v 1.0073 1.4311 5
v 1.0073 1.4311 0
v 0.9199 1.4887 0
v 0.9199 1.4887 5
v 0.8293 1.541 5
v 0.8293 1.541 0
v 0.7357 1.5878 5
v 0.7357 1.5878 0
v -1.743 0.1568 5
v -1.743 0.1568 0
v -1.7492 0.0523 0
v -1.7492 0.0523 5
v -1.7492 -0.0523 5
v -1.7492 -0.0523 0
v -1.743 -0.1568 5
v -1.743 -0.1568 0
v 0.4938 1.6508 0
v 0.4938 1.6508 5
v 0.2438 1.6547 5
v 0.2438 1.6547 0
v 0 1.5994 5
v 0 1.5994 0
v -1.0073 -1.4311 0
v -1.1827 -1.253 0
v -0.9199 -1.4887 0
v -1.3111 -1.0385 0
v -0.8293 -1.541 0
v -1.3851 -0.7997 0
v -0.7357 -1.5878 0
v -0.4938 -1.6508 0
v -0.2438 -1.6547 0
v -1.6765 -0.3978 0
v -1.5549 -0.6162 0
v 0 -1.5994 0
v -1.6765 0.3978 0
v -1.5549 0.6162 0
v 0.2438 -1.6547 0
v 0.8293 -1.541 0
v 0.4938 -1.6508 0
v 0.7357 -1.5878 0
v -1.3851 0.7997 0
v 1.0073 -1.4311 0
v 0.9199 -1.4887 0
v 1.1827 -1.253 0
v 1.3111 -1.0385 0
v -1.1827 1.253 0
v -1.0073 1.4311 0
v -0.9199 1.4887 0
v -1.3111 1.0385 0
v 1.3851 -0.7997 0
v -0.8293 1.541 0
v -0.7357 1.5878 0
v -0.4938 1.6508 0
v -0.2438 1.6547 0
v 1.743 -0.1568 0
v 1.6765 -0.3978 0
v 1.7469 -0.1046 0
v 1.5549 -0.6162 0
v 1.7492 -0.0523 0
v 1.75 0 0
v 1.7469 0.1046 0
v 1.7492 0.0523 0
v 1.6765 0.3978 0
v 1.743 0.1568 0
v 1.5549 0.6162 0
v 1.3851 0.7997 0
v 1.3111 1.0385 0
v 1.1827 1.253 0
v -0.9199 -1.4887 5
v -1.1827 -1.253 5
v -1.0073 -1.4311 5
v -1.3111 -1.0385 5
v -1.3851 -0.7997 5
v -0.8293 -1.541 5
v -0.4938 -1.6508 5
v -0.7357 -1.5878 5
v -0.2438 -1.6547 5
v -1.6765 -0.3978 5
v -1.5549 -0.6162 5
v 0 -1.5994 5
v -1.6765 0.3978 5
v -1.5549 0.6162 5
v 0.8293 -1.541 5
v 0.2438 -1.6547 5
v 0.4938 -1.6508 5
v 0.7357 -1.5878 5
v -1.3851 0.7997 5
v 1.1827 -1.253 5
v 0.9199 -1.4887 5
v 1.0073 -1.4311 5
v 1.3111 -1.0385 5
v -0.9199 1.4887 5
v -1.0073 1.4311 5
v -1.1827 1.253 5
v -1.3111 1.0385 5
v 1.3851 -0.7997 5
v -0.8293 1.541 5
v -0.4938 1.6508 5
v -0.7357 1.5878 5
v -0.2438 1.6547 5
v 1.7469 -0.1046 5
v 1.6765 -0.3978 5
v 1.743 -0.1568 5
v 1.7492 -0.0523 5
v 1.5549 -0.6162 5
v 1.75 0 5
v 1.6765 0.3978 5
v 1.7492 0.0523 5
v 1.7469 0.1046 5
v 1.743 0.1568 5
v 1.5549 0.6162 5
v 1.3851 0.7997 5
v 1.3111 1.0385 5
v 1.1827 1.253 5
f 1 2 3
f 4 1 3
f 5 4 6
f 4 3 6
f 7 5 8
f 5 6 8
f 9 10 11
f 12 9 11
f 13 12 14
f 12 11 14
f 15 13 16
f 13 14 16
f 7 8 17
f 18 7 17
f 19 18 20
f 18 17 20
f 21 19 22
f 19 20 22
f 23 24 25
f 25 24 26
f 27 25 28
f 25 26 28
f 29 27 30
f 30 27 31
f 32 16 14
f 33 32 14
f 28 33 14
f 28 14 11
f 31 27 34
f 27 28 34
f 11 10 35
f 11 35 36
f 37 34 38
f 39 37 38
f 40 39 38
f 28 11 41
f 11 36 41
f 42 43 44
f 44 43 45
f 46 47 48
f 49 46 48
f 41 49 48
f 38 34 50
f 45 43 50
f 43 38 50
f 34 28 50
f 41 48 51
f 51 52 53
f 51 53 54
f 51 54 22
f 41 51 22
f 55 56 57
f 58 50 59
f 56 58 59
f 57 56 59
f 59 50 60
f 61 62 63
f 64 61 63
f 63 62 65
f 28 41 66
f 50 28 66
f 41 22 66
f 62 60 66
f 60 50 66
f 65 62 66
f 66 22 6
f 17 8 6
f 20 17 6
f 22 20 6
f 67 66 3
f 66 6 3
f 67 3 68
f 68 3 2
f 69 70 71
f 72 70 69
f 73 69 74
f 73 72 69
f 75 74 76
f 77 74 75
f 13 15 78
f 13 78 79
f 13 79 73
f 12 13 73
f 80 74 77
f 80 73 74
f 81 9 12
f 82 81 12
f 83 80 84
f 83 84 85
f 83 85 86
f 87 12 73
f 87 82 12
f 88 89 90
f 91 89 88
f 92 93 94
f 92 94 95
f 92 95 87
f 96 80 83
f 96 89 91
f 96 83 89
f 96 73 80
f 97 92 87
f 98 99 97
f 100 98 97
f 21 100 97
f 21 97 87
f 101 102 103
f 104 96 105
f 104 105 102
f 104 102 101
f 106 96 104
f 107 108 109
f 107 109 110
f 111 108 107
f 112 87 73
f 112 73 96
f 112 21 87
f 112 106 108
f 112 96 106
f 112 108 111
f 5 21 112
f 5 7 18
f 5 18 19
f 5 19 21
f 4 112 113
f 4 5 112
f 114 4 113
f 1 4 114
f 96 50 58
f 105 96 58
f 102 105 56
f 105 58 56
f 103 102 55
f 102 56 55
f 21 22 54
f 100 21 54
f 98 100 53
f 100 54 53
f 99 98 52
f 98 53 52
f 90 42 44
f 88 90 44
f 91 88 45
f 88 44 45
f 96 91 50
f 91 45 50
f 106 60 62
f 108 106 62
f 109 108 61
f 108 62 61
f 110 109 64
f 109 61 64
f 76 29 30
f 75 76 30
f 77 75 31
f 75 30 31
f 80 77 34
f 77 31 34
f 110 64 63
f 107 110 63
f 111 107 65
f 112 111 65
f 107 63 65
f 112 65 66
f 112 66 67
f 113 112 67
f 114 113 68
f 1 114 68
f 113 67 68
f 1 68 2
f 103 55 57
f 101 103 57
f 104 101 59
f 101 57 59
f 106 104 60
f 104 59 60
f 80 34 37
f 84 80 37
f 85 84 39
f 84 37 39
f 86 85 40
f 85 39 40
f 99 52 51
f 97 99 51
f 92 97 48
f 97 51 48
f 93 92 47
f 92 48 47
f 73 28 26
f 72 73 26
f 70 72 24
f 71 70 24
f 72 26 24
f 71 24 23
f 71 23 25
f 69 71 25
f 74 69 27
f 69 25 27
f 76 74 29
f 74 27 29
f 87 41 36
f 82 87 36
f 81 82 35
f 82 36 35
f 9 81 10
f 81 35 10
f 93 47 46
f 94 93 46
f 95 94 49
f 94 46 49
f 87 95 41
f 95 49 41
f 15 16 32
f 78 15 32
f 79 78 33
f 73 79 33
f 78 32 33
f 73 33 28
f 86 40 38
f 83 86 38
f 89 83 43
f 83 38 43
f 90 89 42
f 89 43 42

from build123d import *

# Parameters (mm, degrees)
F1_DEPTH = 5


with BuildPart() as f1:
    # F0 (on Top) → F1 (new body)
    with BuildSketch(Plane.XY):
        with BuildLine():
            ThreePointArc((1.7429623373, -0.1567874062), (1.748239699, -0.0784726376), (1.75, 0))
            ThreePointArc((1.75, 0), (1.748239699, 0.0784726376), (1.7429623373, 0.1567874062))
            ThreePointArc((1.7429623373, 0.1567874062), (1.6222133761, 0.5106191558), (1.3851445143, 0.7997135582))
            ThreePointArc((1.3851445143, 0.7997135582), (1.3980525813, 0.7054063545), (1.4023670894, 0.6103177017))
            ThreePointArc((1.4023670894, 0.6103177017), (1.3522740733, 0.2898711016), (1.2067746637, 0))
            ThreePointArc((1.2067746637, 0), (1.3522740733, -0.2898711016), (1.4023670894, -0.6103177017))
            ThreePointArc((1.4023670894, -0.6103177017), (1.3980525813, -0.7054063545), (1.3851445143, -0.7997135582))
            ThreePointArc((1.3851445143, -0.7997135582), (1.6222133761, -0.5106191558), (1.7429623373, -0.1567874062))
        make_face()
        with BuildLine():
            ThreePointArc((1.3851445143, 0.7997135582), (1.2533158487, 1.1495684162), (1.0072630454, 1.4310559589))
            ThreePointArc((1.0072630454, 1.4310559589), (0.875, 1.5155444566), (0.7356992919, 1.587843365))
            ThreePointArc((0.7356992919, 1.587843365), (0.3688975274, 1.660187572), (0, 1.5994271164))
            ThreePointArc((0, 1.5994271164), (0.357996056, 1.3835474229), (0.6033873318, 1.0450975154))
            ThreePointArc((0.6033873318, 1.0450975154), (1.0191891876, 1.0018073904), (1.3851445143, 0.7997135582))
        make_face()
        with BuildLine():
            ThreePointArc((1.4023670894, 0.6103177017), (1.3980525813, 0.7054063545), (1.3851445143, 0.7997135582))
            ThreePointArc((1.3851445143, 0.7997135582), (1.0191891876, 1.0018073904), (0.6033873318, 1.0450975154))
            ThreePointArc((0.6033873318, 1.0450975154), (0.6738010602, 0.8327562974), (0.6976329106, 0.6103177017))
            ThreePointArc((0.6976329106, 0.6103177017), (0.6917287242, 0.4991244824), (0.6740825639, 0.3891817497))
            ThreePointArc((0.6740825639, 0.3891817497), (0.9717877583, 0.23751367), (1.2067746637, 0))
            ThreePointArc((1.2067746637, 0), (1.3522740733, 0.2898711016), (1.4023670894, 0.6103177017))
        make_face()
        with BuildLine():
            ThreePointArc((0.7356992919, -1.587843365), (0.875, -1.5155444566), (1.0072630454, -1.4310559589))
            ThreePointArc((1.0072630454, -1.4310559589), (1.2533158487, -1.1495684162), (1.3851445143, -0.7997135582))
            ThreePointArc((1.3851445143, -0.7997135582), (1.0191891876, -1.0018073904), (0.6033873318, -1.0450975154))
            ThreePointArc((0.6033873318, -1.0450975154), (0.357996056, -1.3835474229), (0, -1.5994271164))
            ThreePointArc((0, -1.5994271164), (0.3688975274, -1.660187572), (0.7356992919, -1.587843365))
        make_face()
        with BuildLine():
            ThreePointArc((0.6033873318, -1.0450975154), (1.0191891876, -1.0018073904), (1.3851445143, -0.7997135582))
            ThreePointArc((1.3851445143, -0.7997135582), (1.3980525813, -0.7054063545), (1.4023670894, -0.6103177017))
            ThreePointArc((1.4023670894, -0.6103177017), (1.3522740733, -0.2898711016), (1.2067746637, 0))
            ThreePointArc((1.2067746637, 0), (0.9717877583, -0.23751367), (0.6740825639, -0.3891817497))
            ThreePointArc((0.6740825639, -0.3891817497), (0.6917287242, -0.4991244824), (0.6976329106, -0.6103177017))
            ThreePointArc((0.6976329106, -0.6103177017), (0.6738010602, -0.8327562974), (0.6033873318, -1.0450975154))
        make_face()
        with BuildLine():
            ThreePointArc((0.6976329106, 0.6103177017), (0.6738010602, 0.8327562974), (0.6033873318, 1.0450975154))
            ThreePointArc((0.6033873318, 1.0450975154), (0.2802010071, 0.9603497208), (0, 0.7783634995))
            ThreePointArc((0, 0.7783634995), (0.143097193, 0.6194206689), (0.2510202425, 0.4347798137))
            ThreePointArc((0.2510202425, 0.4347798137), (0.4648854384, 0.4336361388), (0.6740825639, 0.3891817497))
            ThreePointArc((0.6740825639, 0.3891817497), (0.6917287242, 0.4991244824), (0.6976329106, 0.6103177017))
        make_face()
        with BuildLine():
            ThreePointArc((0, 0.7783634995), (0.2802010071, 0.9603497208), (0.6033873318, 1.0450975154))
            ThreePointArc((0.6033873318, 1.0450975154), (0.357996056, 1.3835474229), (0, 1.5994271164))
            ThreePointArc((0, 1.5994271164), (-0.357996056, 1.3835474229), (-0.6033873318, 1.0450975154))
            ThreePointArc((-0.6033873318, 1.0450975154), (-0.2802010071, 0.9603497208), (0, 0.7783634995))
        make_face()
        with BuildLine():
            ThreePointArc((0, -0.7783634995), (0.2802010071, -0.9603497208), (0.6033873318, -1.0450975154))
            ThreePointArc((0.6033873318, -1.0450975154), (0.6738010602, -0.8327562974), (0.6976329106, -0.6103177017))
            ThreePointArc((0.6976329106, -0.6103177017), (0.6917287242, -0.4991244824), (0.6740825639, -0.3891817497))
            ThreePointArc((0.6740825639, -0.3891817497), (0.4648854384, -0.4336361388), (0.2510202425, -0.4347798137))
            ThreePointArc((0.2510202425, -0.4347798137), (0.143097193, -0.6194206689), (0, -0.7783634995))
        make_face()
        with BuildLine():
            ThreePointArc((0, -1.5994271164), (0.357996056, -1.3835474229), (0.6033873318, -1.0450975154))
            ThreePointArc((0.6033873318, -1.0450975154), (0.2802010071, -0.9603497208), (0, -0.7783634995))
            ThreePointArc((0, -0.7783634995), (-0.2802010071, -0.9603497208), (-0.6033873318, -1.0450975154))
            ThreePointArc((-0.6033873318, -1.0450975154), (-0.357996056, -1.3835474229), (0, -1.5994271164))
        make_face()
        with BuildLine():
            ThreePointArc((0, 1.5994271164), (-0.3688975274, 1.660187572), (-0.7356992919, 1.587843365))
            ThreePointArc((-0.7356992919, 1.587843365), (-0.875, 1.5155444566), (-1.0072630454, 1.4310559589))
            ThreePointArc((-1.0072630454, 1.4310559589), (-1.2533158487, 1.1495684162), (-1.3851445143, 0.7997135582))
            ThreePointArc((-1.3851445143, 0.7997135582), (-1.0191891876, 1.0018073904), (-0.6033873318, 1.0450975154))
            ThreePointArc((-0.6033873318, 1.0450975154), (-0.357996056, 1.3835474229), (0, 1.5994271164))
        make_face()
        with BuildLine():
            ThreePointArc((-0.2510202425, 0.4347798137), (-0.143097193, 0.6194206689), (0, 0.7783634995))
            ThreePointArc((0, 0.7783634995), (-0.2802010071, 0.9603497208), (-0.6033873318, 1.0450975154))
            ThreePointArc((-0.6033873318, 1.0450975154), (-0.6915867512, 0.7228360507), (-0.6740825639, 0.3891817497))
            ThreePointArc((-0.6740825639, 0.3891817497), (-0.4648854384, 0.4336361388), (-0.2510202425, 0.4347798137))
        make_face()
        with BuildLine():
            ThreePointArc((0.2510202425, 0.4347798137), (0.143097193, 0.6194206689), (0, 0.7783634995))
            ThreePointArc((0, 0.7783634995), (-0.143097193, 0.6194206689), (-0.2510202425, 0.4347798137))
            ThreePointArc((-0.2510202425, 0.4347798137), (-0.1237894202, 0.4145004525), (0, 0.3787917131))
            ThreePointArc((0, 0.3787917131), (0.1237894202, 0.4145004525), (0.2510202425, 0.4347798137))
        make_face()
        with BuildLine():
            ThreePointArc((0.6740825639, -0.3891817497), (0.9717877583, -0.23751367), (1.2067746637, 0))
            ThreePointArc((1.2067746637, 0), (0.9717877583, 0.23751367), (0.6740825639, 0.3891817497))
            ThreePointArc((0.6740825639, 0.3891817497), (0.6079826314, 0.1857845301), (0.5020404849, 0))
            ThreePointArc((0.5020404849, 0), (0.6079826314, -0.1857845301), (0.6740825639, -0.3891817497))
        make_face()
        with BuildLine():
            ThreePointArc((-1.0072630454, -1.4310559589), (-0.875, -1.5155444566), (-0.7356992919, -1.587843365))
            ThreePointArc((-0.7356992919, -1.587843365), (-0.3688975274, -1.660187572), (0, -1.5994271164))
            ThreePointArc((0, -1.5994271164), (-0.357996056, -1.3835474229), (-0.6033873318, -1.0450975154))
            ThreePointArc((-0.6033873318, -1.0450975154), (-1.0191891876, -1.0018073904), (-1.3851445143, -0.7997135582))
            ThreePointArc((-1.3851445143, -0.7997135582), (-1.2533158487, -1.1495684162), (-1.0072630454, -1.4310559589))
        make_face()
        with BuildLine():
            ThreePointArc((-0.2510202425, -0.4347798137), (-0.143097193, -0.6194206689), (0, -0.7783634995))
            ThreePointArc((0, -0.7783634995), (0.143097193, -0.6194206689), (0.2510202425, -0.4347798137))
            ThreePointArc((0.2510202425, -0.4347798137), (0.1237894202, -0.4145004525), (0, -0.3787917131))
            ThreePointArc((0, -0.3787917131), (-0.1237894202, -0.4145004525), (-0.2510202425, -0.4347798137))
        make_face()
        with BuildLine():
            ThreePointArc((-0.6033873318, -1.0450975154), (-0.2802010071, -0.9603497208), (0, -0.7783634995))
            ThreePointArc((0, -0.7783634995), (-0.143097193, -0.6194206689), (-0.2510202425, -0.4347798137))
            ThreePointArc((-0.2510202425, -0.4347798137), (-0.4648854384, -0.4336361388), (-0.6740825639, -0.3891817497))
            ThreePointArc((-0.6740825639, -0.3891817497), (-0.6915867512, -0.7228360507), (-0.6033873318, -1.0450975154))
        make_face()
        with BuildLine():
            ThreePointArc((-0.6740825639, 0.3891817497), (-0.6915867512, 0.7228360507), (-0.6033873318, 1.0450975154))
            ThreePointArc((-0.6033873318, 1.0450975154), (-1.0191891876, 1.0018073904), (-1.3851445143, 0.7997135582))
            ThreePointArc((-1.3851445143, 0.7997135582), (-1.3771852436, 0.3817400325), (-1.2067746637, 0))
            ThreePointArc((-1.2067746637, 0), (-0.9717877583, 0.23751367), (-0.6740825639, 0.3891817497))
        make_face()
        with BuildLine():
            ThreePointArc((0.6740825639, 0.3891817497), (0.4648854384, 0.4336361388), (0.2510202425, 0.4347798137))
            ThreePointArc((0.2510202425, 0.4347798137), (0.2970732116, 0.3144550089), (0.3280432462, 0.1893958565))
            ThreePointArc((0.3280432462, 0.1893958565), (0.4208626318, 0.1000454436), (0.5020404849, 0))
            ThreePointArc((0.5020404849, 0), (0.6079826314, 0.1857845301), (0.6740825639, 0.3891817497))
        make_face()
        with BuildLine():
            ThreePointArc((0.3280432462, 0.1893958565), (0.2970732116, 0.3144550089), (0.2510202425, 0.4347798137))
            ThreePointArc((0.2510202425, 0.4347798137), (0.1237894202, 0.4145004525), (0, 0.3787917131))
            ThreePointArc((0, 0.3787917131), (0.1726329106, 0.2990089723), (0.3280432462, 0.1893958565))
        make_face()
        with BuildLine():
            ThreePointArc((-0.3280432462, 0.1893958565), (-0.2970732116, 0.3144550089), (-0.2510202425, 0.4347798137))
            ThreePointArc((-0.2510202425, 0.4347798137), (-0.4648854384, 0.4336361388), (-0.6740825639, 0.3891817497))
            ThreePointArc((-0.6740825639, 0.3891817497), (-0.6079826314, 0.1857845301), (-0.5020404849, 0))
            ThreePointArc((-0.5020404849, 0), (-0.4208626318, 0.1000454436), (-0.3280432462, 0.1893958565))
        make_face()
        with BuildLine():
            ThreePointArc((0, 0.3787917131), (-0.1237894202, 0.4145004525), (-0.2510202425, 0.4347798137))
            ThreePointArc((-0.2510202425, 0.4347798137), (-0.2970732116, 0.3144550089), (-0.3280432462, 0.1893958565))
            ThreePointArc((-0.3280432462, 0.1893958565), (-0.1726329106, 0.2990089723), (0, 0.3787917131))
        make_face()
        with BuildLine():
            ThreePointArc((0.2510202425, -0.4347798137), (0.4648854384, -0.4336361388), (0.6740825639, -0.3891817497))
            ThreePointArc((0.6740825639, -0.3891817497), (0.6079826314, -0.1857845301), (0.5020404849, 0))
            ThreePointArc((0.5020404849, 0), (0.4208626318, -0.1000454436), (0.3280432462, -0.1893958565))
            ThreePointArc((0.3280432462, -0.1893958565), (0.2970732116, -0.3144550089), (0.2510202425, -0.4347798137))
        make_face()
        with BuildLine():
            ThreePointArc((-1.3851445143, -0.7997135582), (-1.0191891876, -1.0018073904), (-0.6033873318, -1.0450975154))
            ThreePointArc((-0.6033873318, -1.0450975154), (-0.6915867512, -0.7228360507), (-0.6740825639, -0.3891817497))
            ThreePointArc((-0.6740825639, -0.3891817497), (-0.9717877583, -0.23751367), (-1.2067746637, 0))
            ThreePointArc((-1.2067746637, 0), (-1.3771852436, -0.3817400325), (-1.3851445143, -0.7997135582))
        make_face()
        with BuildLine():
            ThreePointArc((0, -0.3787917131), (0.1237894202, -0.4145004525), (0.2510202425, -0.4347798137))
            ThreePointArc((0.2510202425, -0.4347798137), (0.2970732116, -0.3144550089), (0.3280432462, -0.1893958565))
            ThreePointArc((0.3280432462, -0.1893958565), (0.1726329106, -0.2990089723), (0, -0.3787917131))
        make_face()
        with BuildLine():
            ThreePointArc((-0.6740825639, -0.3891817497), (-0.4648854384, -0.4336361388), (-0.2510202425, -0.4347798137))
            ThreePointArc((-0.2510202425, -0.4347798137), (-0.2970732116, -0.3144550089), (-0.3280432462, -0.1893958565))
            ThreePointArc((-0.3280432462, -0.1893958565), (-0.4208626318, -0.1000454436), (-0.5020404849, 0))
            ThreePointArc((-0.5020404849, 0), (-0.6079826314, -0.1857845301), (-0.6740825639, -0.3891817497))
        make_face()
        with BuildLine():
            ThreePointArc((-0.3280432462, -0.1893958565), (-0.2970732116, -0.3144550089), (-0.2510202425, -0.4347798137))
            ThreePointArc((-0.2510202425, -0.4347798137), (-0.1237894202, -0.4145004525), (0, -0.3787917131))
            ThreePointArc((0, -0.3787917131), (-0.1726329106, -0.2990089723), (-0.3280432462, -0.1893958565))
        make_face()
        with BuildLine():
            ThreePointArc((-1.3851445143, 0.7997135582), (-1.6222133761, 0.5106191558), (-1.7429623373, 0.1567874062))
            ThreePointArc((-1.7429623373, 0.1567874062), (-1.75, 0), (-1.7429623373, -0.1567874062))
            ThreePointArc((-1.7429623373, -0.1567874062), (-1.6222133761, -0.5106191558), (-1.3851445143, -0.7997135582))
            ThreePointArc((-1.3851445143, -0.7997135582), (-1.3771852436, -0.3817400325), (-1.2067746637, 0))
            ThreePointArc((-1.2067746637, 0), (-1.3771852436, 0.3817400325), (-1.3851445143, 0.7997135582))
        make_face()
        with BuildLine():
            ThreePointArc((-0.5020404849, 0), (-0.6079826314, 0.1857845301), (-0.6740825639, 0.3891817497))
            ThreePointArc((-0.6740825639, 0.3891817497), (-0.9717877583, 0.23751367), (-1.2067746637, 0))
            ThreePointArc((-1.2067746637, 0), (-0.9717877583, -0.23751367), (-0.6740825639, -0.3891817497))
            ThreePointArc((-0.6740825639, -0.3891817497), (-0.6079826314, -0.1857845301), (-0.5020404849, 0))
        make_face()
        with BuildLine():
            ThreePointArc((0.5020404849, 0), (0.4208626318, 0.1000454436), (0.3280432462, 0.1893958565))
            ThreePointArc((0.3280432462, 0.1893958565), (0.3409513132, 0.0950886528), (0.3452658213, 0))
            ThreePointArc((0.3452658213, 0), (0.3409513132, -0.0950886528), (0.3280432462, -0.1893958565))
            ThreePointArc((0.3280432462, -0.1893958565), (0.4208626318, -0.1000454436), (0.5020404849, 0))
        make_face()
        with BuildLine():
            ThreePointArc((0.3452658213, 0), (0.3409513132, 0.0950886528), (0.3280432462, 0.1893958565))
            ThreePointArc((0.3280432462, 0.1893958565), (0.1726329106, 0.2990089723), (0, 0.3787917131))
            ThreePointArc((0, 0.3787917131), (-0.1726329106, 0.2990089723), (-0.3280432462, 0.1893958565))
            ThreePointArc((-0.3280432462, 0.1893958565), (-0.3452658213, 0), (-0.3280432462, -0.1893958565))
            ThreePointArc((-0.3280432462, -0.1893958565), (-0.1726329106, -0.2990089723), (0, -0.3787917131))
            ThreePointArc((0, -0.3787917131), (0.1726329106, -0.2990089723), (0.3280432462, -0.1893958565))
            ThreePointArc((0.3280432462, -0.1893958565), (0.3409513132, -0.0950886528), (0.3452658213, 0))
        make_face()
        with BuildLine():
            ThreePointArc((-0.3280432462, -0.1893958565), (-0.3452658213, 0), (-0.3280432462, 0.1893958565))
            ThreePointArc((-0.3280432462, 0.1893958565), (-0.4208626318, 0.1000454436), (-0.5020404849, 0))
            ThreePointArc((-0.5020404849, 0), (-0.4208626318, -0.1000454436), (-0.3280432462, -0.1893958565))
        make_face()
    extrude(amount=F1_DEPTH)


solid = f1.part
